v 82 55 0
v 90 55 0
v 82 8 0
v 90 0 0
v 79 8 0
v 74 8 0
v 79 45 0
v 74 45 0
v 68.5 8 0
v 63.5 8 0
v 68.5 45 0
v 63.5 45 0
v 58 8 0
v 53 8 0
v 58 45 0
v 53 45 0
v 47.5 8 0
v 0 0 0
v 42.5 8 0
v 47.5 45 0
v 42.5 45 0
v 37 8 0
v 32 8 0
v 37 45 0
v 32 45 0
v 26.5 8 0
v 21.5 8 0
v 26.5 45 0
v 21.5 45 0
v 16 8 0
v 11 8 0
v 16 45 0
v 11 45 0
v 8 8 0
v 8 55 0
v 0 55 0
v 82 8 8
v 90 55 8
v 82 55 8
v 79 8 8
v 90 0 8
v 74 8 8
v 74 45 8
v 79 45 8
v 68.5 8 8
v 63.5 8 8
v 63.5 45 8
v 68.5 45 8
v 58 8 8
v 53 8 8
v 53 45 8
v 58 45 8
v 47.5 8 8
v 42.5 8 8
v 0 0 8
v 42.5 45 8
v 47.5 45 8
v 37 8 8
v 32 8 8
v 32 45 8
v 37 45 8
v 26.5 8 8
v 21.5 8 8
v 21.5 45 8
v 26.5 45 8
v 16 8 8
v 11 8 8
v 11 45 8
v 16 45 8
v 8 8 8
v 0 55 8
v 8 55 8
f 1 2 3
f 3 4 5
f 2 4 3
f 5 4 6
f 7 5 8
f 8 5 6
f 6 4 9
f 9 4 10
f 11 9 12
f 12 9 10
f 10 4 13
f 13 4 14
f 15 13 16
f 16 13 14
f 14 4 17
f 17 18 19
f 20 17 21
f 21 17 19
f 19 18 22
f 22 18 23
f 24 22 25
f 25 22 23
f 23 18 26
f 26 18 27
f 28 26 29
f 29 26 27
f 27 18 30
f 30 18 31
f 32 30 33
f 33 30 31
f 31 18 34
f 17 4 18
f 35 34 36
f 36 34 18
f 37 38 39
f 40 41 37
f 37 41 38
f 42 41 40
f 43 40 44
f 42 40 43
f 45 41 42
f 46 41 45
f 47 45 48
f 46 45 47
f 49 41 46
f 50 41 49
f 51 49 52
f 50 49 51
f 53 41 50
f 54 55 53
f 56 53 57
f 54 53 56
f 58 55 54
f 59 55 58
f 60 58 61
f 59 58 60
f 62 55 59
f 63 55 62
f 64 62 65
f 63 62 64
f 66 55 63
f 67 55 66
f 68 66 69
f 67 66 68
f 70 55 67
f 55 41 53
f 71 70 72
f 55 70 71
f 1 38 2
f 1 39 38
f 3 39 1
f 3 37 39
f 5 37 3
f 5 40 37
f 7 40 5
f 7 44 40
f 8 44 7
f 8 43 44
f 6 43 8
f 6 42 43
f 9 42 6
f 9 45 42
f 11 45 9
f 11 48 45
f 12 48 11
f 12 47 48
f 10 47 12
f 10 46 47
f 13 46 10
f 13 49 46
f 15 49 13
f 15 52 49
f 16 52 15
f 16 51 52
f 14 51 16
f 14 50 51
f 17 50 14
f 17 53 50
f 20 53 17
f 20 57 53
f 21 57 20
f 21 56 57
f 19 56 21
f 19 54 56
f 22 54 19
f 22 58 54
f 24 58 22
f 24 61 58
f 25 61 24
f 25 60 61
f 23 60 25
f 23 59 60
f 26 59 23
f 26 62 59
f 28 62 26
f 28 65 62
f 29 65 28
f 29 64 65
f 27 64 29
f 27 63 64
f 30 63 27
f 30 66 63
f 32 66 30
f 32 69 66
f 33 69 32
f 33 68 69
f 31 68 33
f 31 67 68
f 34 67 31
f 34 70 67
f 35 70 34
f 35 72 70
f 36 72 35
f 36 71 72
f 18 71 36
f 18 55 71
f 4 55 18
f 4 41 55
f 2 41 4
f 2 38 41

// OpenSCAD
$fn = 32;

// ----------------------------------------------------------------------
// Guard grille: 7 slats over a 90 x 55 mm plate
// ----------------------------------------------------------------------

// --- parameters (mm) ---
profile_height = 8;       // extrusion height
profile_points = 36;      // points of the closed outline

profile = [[0, 0], [90, 0], [90, 55], [82, 55], [82, 8], [79, 8], [79, 45], [74, 45], [74, 8], [68.5, 8], [68.5, 45], [63.5, 45], [63.5, 8], [58, 8], [58, 45], [53, 45], [53, 8], [47.5, 8], [47.5, 45], [42.5, 45], [42.5, 8], [37, 8], [37, 45], [32, 45], [32, 8], [26.5, 8], [26.5, 45], [21.5, 45], [21.5, 8], [16, 8], [16, 45], [11, 45], [11, 8], [8, 8], [8, 55], [0, 55]];  // single closed polygon, 36 points, counter clockwise

// --- the one profile operation ---
linear_extrude(height = profile_height) polygon(points = profile);
